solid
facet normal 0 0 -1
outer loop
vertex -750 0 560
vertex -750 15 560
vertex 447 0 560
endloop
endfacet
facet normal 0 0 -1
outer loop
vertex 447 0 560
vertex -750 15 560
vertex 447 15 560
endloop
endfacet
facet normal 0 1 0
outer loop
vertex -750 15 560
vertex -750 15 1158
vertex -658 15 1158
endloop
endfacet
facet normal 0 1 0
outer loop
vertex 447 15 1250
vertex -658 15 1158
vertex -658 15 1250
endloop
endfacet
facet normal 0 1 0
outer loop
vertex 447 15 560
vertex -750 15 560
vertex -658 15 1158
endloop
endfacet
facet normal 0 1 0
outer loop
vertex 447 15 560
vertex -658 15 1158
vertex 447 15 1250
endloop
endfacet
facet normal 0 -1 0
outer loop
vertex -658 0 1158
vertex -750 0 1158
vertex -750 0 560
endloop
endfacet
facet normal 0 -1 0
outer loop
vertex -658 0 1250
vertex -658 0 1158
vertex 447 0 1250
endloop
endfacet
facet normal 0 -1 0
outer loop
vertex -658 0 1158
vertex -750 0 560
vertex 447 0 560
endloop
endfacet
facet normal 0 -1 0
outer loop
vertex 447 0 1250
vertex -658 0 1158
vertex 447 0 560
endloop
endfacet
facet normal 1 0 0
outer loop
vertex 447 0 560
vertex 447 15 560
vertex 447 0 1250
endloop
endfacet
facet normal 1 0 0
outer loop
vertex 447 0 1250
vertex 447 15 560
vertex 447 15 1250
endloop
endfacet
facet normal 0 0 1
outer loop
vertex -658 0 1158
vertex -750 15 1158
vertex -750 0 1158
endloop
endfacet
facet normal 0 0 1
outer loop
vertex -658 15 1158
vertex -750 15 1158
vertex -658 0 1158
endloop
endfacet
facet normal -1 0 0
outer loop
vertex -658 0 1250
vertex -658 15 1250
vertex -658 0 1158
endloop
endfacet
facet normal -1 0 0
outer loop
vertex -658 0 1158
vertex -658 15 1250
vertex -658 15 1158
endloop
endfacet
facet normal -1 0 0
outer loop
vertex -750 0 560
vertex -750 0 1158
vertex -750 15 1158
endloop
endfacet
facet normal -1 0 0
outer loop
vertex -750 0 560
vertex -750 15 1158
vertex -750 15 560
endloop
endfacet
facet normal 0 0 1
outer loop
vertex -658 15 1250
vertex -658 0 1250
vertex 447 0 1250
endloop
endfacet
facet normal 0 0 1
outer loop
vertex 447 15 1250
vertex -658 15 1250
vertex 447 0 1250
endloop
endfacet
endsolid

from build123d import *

# Parameters (mm, degrees)
SKETCH1_W                   = 1500
SKETCH1_H                   = 2500
PLACA_BASE_PAVIMENTO_DEPTH  = 15
CORTE_PARA_PLACA_BASE_DEPTH = 1458.815146032
SKETCH7_W                   = 1197
SKETCH7_H                   = 1710
PLACA_BASE_RESTO_DEPTH      = 1458.815146032
SKETCH3_W                   = 92
SKETCH3_H                   = 92
CANTO_ESQUERDO_DEPTH        = 1458.815146032


with BuildPart() as part:
    # Sketch1 → Placa Base Pavimento (new body)
    with BuildSketch(Plane(origin=(0, 0, 0), x_dir=(1, 0, 0), z_dir=(0, 1, 0))):
        Rectangle(SKETCH1_W, SKETCH1_H)
    extrude(amount=PLACA_BASE_PAVIMENTO_DEPTH)

    # Sketch2 → Corte Para Placa Base (cut, through all)
    with BuildSketch(Plane(origin=(0, 15, 0), x_dir=(1, 0, 0), z_dir=(0, 1, 0))):
        Polygon((-750, 1150), (447, 1150), (447, -1250), (750, -1250), (750, 1250), (-750, 1250), align=None)
    extrude(amount=-CORTE_PARA_PLACA_BASE_DEPTH, mode=Mode.SUBTRACT)

    # Sketch7 → Placa Base Resto (cut, through all)
    with BuildSketch(Plane(origin=(0, 15, 0), x_dir=(1, 0, 0), z_dir=(0, 1, 0))):
        with Locations((-151.5, 295)):
            Rectangle(SKETCH7_W, SKETCH7_H)
    extrude(amount=-PLACA_BASE_RESTO_DEPTH, mode=Mode.SUBTRACT)

    # Sketch3 → Canto Esquerdo (cut, through all)
    with BuildSketch(Plane(origin=(0, 15, 0), x_dir=(1, 0, 0), z_dir=(0, 1, 0))):
        with Locations((-704, -1204)):
            Rectangle(SKETCH3_W, SKETCH3_H)
    extrude(amount=-CANTO_ESQUERDO_DEPTH, mode=Mode.SUBTRACT)


solid = part.part
